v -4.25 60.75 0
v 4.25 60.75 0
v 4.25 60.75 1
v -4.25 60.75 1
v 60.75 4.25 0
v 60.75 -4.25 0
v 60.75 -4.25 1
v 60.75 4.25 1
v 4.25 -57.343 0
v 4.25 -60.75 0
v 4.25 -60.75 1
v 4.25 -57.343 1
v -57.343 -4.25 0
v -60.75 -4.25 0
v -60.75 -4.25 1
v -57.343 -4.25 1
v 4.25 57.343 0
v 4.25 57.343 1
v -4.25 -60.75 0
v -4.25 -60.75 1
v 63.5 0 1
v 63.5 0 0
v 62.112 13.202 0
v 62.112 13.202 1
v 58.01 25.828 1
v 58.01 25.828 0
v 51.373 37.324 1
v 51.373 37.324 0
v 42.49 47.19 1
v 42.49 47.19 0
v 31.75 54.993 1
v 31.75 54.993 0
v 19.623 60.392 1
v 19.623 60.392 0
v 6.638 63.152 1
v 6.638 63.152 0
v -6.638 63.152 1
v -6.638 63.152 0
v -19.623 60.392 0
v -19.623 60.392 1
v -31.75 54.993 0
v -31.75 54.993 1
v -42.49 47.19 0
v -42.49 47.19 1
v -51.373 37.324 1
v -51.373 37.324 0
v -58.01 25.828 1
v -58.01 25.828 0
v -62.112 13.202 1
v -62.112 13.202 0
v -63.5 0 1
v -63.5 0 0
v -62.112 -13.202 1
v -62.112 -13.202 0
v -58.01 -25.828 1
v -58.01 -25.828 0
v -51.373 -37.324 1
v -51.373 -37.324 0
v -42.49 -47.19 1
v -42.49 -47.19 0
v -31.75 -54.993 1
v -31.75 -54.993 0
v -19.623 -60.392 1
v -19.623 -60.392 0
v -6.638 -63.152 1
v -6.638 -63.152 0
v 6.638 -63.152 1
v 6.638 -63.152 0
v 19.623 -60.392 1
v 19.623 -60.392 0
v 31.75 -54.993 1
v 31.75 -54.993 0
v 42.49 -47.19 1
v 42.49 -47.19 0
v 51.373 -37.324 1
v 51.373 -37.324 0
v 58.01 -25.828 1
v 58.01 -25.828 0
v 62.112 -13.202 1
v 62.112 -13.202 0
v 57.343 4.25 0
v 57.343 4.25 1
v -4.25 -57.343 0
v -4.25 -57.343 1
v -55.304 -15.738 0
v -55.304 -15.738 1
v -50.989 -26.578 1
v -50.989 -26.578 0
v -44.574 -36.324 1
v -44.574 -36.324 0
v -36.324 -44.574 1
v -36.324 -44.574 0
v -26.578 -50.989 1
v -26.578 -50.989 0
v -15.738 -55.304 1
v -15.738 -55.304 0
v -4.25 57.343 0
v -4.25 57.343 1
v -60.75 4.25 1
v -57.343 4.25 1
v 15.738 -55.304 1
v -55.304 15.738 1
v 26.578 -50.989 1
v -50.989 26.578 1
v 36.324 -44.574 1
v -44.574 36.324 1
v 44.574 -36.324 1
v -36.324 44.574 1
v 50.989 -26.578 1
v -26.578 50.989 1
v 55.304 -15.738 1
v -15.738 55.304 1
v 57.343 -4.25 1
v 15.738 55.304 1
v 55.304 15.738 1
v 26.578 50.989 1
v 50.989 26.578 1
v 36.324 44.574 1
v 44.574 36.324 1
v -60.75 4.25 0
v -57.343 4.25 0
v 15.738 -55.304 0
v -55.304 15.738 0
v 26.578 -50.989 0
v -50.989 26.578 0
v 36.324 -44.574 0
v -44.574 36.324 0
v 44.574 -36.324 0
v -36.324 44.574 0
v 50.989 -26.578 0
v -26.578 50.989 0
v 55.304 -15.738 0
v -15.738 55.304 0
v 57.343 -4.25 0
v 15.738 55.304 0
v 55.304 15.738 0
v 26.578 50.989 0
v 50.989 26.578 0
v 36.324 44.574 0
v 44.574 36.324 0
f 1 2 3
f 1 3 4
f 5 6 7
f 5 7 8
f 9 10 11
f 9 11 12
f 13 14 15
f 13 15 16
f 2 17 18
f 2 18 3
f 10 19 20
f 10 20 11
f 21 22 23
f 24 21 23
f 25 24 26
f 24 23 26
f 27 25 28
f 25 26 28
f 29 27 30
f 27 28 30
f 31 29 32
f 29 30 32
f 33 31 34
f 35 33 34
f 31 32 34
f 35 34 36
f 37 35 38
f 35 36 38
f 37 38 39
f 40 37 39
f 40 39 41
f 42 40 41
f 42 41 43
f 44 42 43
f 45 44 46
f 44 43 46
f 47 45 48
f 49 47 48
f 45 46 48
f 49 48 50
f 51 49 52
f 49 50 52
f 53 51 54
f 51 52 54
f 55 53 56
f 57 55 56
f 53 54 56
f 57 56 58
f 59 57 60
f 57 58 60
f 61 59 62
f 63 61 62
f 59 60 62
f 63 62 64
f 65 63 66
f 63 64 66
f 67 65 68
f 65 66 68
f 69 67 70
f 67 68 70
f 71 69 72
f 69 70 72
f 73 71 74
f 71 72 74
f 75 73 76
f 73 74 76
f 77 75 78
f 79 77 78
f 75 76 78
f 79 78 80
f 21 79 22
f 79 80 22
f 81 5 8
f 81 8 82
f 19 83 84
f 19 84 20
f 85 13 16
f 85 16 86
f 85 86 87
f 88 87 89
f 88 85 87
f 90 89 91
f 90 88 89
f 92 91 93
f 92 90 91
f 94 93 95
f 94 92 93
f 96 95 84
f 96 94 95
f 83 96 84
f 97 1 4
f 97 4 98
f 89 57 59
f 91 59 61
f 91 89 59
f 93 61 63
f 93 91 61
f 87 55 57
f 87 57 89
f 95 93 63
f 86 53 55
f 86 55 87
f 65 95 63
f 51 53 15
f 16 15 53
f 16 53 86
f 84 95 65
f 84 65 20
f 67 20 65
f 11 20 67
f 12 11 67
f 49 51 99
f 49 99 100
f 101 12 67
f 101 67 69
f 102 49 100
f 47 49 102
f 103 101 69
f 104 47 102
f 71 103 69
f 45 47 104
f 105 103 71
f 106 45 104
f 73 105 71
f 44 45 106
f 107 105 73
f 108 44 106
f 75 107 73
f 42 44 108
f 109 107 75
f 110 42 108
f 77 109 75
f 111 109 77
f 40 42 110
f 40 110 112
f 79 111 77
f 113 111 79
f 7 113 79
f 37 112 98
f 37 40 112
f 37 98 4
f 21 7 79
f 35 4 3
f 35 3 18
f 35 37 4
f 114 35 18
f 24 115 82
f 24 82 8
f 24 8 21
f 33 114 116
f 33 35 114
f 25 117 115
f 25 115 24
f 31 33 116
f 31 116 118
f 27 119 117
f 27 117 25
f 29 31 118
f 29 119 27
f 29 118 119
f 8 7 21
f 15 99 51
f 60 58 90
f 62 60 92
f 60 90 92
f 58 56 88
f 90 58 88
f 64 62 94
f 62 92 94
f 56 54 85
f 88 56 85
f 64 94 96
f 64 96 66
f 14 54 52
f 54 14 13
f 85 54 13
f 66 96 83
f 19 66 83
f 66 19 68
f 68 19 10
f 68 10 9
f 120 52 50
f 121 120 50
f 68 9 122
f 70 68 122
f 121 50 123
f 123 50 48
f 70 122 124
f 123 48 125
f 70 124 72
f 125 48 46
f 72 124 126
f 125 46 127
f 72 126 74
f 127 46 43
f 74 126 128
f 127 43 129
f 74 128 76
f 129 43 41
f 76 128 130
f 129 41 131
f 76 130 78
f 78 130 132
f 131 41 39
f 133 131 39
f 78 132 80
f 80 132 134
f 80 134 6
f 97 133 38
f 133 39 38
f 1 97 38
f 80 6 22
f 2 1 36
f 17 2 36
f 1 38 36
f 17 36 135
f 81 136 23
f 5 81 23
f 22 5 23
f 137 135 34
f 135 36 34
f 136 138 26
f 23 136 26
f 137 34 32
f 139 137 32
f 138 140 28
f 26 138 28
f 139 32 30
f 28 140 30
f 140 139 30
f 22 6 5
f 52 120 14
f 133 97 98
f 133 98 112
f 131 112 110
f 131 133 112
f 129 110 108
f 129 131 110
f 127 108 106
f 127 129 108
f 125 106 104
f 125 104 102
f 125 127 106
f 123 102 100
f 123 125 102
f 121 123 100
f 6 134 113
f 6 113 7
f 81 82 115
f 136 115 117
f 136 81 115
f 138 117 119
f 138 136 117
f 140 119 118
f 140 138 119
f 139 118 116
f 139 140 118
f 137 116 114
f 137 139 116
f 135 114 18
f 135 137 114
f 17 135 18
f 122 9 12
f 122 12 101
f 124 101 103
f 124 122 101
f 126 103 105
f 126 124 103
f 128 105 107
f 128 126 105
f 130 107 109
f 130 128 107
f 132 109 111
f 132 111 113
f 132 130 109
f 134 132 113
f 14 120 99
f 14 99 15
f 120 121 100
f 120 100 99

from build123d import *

# Parameters (mm, degrees)
F0_R     = 63.5
F0_R_2   = 57.5
F1_DEPTH = 1
F3_DEPTH = 25


with BuildPart() as f1:
    # F0 (on Top) → F1 (new body)
    with BuildSketch(Plane.XY):
        Circle(F0_R)
        Circle(F0_R_2, mode=Mode.SUBTRACT)
    extrude(amount=F1_DEPTH)

    # F2 (on Top) → F3 (cut)
    with BuildSketch(Plane.XY):
        Polygon((4.25, 60.75), (0, 60.75), (-4.25, 60.75), (-4.25, 56.5), (4.25, 56.5), align=None)
        Polygon((-4.25, -60.75), (0, -60.75), (4.25, -60.75), (4.25, -56.5), (-4.25, -56.5), align=None)
        Polygon((-60.75, 4.25), (-60.75, 0), (-60.75, -4.25), (-56.5, -4.25), (-56.5, 4.25), align=None)
        Polygon((60.75, -4.25), (60.75, 0), (60.75, 4.25), (56.5, 4.25), (56.5, -4.25), align=None)
    extrude(amount=F3_DEPTH, mode=Mode.SUBTRACT)


solid = f1.part
